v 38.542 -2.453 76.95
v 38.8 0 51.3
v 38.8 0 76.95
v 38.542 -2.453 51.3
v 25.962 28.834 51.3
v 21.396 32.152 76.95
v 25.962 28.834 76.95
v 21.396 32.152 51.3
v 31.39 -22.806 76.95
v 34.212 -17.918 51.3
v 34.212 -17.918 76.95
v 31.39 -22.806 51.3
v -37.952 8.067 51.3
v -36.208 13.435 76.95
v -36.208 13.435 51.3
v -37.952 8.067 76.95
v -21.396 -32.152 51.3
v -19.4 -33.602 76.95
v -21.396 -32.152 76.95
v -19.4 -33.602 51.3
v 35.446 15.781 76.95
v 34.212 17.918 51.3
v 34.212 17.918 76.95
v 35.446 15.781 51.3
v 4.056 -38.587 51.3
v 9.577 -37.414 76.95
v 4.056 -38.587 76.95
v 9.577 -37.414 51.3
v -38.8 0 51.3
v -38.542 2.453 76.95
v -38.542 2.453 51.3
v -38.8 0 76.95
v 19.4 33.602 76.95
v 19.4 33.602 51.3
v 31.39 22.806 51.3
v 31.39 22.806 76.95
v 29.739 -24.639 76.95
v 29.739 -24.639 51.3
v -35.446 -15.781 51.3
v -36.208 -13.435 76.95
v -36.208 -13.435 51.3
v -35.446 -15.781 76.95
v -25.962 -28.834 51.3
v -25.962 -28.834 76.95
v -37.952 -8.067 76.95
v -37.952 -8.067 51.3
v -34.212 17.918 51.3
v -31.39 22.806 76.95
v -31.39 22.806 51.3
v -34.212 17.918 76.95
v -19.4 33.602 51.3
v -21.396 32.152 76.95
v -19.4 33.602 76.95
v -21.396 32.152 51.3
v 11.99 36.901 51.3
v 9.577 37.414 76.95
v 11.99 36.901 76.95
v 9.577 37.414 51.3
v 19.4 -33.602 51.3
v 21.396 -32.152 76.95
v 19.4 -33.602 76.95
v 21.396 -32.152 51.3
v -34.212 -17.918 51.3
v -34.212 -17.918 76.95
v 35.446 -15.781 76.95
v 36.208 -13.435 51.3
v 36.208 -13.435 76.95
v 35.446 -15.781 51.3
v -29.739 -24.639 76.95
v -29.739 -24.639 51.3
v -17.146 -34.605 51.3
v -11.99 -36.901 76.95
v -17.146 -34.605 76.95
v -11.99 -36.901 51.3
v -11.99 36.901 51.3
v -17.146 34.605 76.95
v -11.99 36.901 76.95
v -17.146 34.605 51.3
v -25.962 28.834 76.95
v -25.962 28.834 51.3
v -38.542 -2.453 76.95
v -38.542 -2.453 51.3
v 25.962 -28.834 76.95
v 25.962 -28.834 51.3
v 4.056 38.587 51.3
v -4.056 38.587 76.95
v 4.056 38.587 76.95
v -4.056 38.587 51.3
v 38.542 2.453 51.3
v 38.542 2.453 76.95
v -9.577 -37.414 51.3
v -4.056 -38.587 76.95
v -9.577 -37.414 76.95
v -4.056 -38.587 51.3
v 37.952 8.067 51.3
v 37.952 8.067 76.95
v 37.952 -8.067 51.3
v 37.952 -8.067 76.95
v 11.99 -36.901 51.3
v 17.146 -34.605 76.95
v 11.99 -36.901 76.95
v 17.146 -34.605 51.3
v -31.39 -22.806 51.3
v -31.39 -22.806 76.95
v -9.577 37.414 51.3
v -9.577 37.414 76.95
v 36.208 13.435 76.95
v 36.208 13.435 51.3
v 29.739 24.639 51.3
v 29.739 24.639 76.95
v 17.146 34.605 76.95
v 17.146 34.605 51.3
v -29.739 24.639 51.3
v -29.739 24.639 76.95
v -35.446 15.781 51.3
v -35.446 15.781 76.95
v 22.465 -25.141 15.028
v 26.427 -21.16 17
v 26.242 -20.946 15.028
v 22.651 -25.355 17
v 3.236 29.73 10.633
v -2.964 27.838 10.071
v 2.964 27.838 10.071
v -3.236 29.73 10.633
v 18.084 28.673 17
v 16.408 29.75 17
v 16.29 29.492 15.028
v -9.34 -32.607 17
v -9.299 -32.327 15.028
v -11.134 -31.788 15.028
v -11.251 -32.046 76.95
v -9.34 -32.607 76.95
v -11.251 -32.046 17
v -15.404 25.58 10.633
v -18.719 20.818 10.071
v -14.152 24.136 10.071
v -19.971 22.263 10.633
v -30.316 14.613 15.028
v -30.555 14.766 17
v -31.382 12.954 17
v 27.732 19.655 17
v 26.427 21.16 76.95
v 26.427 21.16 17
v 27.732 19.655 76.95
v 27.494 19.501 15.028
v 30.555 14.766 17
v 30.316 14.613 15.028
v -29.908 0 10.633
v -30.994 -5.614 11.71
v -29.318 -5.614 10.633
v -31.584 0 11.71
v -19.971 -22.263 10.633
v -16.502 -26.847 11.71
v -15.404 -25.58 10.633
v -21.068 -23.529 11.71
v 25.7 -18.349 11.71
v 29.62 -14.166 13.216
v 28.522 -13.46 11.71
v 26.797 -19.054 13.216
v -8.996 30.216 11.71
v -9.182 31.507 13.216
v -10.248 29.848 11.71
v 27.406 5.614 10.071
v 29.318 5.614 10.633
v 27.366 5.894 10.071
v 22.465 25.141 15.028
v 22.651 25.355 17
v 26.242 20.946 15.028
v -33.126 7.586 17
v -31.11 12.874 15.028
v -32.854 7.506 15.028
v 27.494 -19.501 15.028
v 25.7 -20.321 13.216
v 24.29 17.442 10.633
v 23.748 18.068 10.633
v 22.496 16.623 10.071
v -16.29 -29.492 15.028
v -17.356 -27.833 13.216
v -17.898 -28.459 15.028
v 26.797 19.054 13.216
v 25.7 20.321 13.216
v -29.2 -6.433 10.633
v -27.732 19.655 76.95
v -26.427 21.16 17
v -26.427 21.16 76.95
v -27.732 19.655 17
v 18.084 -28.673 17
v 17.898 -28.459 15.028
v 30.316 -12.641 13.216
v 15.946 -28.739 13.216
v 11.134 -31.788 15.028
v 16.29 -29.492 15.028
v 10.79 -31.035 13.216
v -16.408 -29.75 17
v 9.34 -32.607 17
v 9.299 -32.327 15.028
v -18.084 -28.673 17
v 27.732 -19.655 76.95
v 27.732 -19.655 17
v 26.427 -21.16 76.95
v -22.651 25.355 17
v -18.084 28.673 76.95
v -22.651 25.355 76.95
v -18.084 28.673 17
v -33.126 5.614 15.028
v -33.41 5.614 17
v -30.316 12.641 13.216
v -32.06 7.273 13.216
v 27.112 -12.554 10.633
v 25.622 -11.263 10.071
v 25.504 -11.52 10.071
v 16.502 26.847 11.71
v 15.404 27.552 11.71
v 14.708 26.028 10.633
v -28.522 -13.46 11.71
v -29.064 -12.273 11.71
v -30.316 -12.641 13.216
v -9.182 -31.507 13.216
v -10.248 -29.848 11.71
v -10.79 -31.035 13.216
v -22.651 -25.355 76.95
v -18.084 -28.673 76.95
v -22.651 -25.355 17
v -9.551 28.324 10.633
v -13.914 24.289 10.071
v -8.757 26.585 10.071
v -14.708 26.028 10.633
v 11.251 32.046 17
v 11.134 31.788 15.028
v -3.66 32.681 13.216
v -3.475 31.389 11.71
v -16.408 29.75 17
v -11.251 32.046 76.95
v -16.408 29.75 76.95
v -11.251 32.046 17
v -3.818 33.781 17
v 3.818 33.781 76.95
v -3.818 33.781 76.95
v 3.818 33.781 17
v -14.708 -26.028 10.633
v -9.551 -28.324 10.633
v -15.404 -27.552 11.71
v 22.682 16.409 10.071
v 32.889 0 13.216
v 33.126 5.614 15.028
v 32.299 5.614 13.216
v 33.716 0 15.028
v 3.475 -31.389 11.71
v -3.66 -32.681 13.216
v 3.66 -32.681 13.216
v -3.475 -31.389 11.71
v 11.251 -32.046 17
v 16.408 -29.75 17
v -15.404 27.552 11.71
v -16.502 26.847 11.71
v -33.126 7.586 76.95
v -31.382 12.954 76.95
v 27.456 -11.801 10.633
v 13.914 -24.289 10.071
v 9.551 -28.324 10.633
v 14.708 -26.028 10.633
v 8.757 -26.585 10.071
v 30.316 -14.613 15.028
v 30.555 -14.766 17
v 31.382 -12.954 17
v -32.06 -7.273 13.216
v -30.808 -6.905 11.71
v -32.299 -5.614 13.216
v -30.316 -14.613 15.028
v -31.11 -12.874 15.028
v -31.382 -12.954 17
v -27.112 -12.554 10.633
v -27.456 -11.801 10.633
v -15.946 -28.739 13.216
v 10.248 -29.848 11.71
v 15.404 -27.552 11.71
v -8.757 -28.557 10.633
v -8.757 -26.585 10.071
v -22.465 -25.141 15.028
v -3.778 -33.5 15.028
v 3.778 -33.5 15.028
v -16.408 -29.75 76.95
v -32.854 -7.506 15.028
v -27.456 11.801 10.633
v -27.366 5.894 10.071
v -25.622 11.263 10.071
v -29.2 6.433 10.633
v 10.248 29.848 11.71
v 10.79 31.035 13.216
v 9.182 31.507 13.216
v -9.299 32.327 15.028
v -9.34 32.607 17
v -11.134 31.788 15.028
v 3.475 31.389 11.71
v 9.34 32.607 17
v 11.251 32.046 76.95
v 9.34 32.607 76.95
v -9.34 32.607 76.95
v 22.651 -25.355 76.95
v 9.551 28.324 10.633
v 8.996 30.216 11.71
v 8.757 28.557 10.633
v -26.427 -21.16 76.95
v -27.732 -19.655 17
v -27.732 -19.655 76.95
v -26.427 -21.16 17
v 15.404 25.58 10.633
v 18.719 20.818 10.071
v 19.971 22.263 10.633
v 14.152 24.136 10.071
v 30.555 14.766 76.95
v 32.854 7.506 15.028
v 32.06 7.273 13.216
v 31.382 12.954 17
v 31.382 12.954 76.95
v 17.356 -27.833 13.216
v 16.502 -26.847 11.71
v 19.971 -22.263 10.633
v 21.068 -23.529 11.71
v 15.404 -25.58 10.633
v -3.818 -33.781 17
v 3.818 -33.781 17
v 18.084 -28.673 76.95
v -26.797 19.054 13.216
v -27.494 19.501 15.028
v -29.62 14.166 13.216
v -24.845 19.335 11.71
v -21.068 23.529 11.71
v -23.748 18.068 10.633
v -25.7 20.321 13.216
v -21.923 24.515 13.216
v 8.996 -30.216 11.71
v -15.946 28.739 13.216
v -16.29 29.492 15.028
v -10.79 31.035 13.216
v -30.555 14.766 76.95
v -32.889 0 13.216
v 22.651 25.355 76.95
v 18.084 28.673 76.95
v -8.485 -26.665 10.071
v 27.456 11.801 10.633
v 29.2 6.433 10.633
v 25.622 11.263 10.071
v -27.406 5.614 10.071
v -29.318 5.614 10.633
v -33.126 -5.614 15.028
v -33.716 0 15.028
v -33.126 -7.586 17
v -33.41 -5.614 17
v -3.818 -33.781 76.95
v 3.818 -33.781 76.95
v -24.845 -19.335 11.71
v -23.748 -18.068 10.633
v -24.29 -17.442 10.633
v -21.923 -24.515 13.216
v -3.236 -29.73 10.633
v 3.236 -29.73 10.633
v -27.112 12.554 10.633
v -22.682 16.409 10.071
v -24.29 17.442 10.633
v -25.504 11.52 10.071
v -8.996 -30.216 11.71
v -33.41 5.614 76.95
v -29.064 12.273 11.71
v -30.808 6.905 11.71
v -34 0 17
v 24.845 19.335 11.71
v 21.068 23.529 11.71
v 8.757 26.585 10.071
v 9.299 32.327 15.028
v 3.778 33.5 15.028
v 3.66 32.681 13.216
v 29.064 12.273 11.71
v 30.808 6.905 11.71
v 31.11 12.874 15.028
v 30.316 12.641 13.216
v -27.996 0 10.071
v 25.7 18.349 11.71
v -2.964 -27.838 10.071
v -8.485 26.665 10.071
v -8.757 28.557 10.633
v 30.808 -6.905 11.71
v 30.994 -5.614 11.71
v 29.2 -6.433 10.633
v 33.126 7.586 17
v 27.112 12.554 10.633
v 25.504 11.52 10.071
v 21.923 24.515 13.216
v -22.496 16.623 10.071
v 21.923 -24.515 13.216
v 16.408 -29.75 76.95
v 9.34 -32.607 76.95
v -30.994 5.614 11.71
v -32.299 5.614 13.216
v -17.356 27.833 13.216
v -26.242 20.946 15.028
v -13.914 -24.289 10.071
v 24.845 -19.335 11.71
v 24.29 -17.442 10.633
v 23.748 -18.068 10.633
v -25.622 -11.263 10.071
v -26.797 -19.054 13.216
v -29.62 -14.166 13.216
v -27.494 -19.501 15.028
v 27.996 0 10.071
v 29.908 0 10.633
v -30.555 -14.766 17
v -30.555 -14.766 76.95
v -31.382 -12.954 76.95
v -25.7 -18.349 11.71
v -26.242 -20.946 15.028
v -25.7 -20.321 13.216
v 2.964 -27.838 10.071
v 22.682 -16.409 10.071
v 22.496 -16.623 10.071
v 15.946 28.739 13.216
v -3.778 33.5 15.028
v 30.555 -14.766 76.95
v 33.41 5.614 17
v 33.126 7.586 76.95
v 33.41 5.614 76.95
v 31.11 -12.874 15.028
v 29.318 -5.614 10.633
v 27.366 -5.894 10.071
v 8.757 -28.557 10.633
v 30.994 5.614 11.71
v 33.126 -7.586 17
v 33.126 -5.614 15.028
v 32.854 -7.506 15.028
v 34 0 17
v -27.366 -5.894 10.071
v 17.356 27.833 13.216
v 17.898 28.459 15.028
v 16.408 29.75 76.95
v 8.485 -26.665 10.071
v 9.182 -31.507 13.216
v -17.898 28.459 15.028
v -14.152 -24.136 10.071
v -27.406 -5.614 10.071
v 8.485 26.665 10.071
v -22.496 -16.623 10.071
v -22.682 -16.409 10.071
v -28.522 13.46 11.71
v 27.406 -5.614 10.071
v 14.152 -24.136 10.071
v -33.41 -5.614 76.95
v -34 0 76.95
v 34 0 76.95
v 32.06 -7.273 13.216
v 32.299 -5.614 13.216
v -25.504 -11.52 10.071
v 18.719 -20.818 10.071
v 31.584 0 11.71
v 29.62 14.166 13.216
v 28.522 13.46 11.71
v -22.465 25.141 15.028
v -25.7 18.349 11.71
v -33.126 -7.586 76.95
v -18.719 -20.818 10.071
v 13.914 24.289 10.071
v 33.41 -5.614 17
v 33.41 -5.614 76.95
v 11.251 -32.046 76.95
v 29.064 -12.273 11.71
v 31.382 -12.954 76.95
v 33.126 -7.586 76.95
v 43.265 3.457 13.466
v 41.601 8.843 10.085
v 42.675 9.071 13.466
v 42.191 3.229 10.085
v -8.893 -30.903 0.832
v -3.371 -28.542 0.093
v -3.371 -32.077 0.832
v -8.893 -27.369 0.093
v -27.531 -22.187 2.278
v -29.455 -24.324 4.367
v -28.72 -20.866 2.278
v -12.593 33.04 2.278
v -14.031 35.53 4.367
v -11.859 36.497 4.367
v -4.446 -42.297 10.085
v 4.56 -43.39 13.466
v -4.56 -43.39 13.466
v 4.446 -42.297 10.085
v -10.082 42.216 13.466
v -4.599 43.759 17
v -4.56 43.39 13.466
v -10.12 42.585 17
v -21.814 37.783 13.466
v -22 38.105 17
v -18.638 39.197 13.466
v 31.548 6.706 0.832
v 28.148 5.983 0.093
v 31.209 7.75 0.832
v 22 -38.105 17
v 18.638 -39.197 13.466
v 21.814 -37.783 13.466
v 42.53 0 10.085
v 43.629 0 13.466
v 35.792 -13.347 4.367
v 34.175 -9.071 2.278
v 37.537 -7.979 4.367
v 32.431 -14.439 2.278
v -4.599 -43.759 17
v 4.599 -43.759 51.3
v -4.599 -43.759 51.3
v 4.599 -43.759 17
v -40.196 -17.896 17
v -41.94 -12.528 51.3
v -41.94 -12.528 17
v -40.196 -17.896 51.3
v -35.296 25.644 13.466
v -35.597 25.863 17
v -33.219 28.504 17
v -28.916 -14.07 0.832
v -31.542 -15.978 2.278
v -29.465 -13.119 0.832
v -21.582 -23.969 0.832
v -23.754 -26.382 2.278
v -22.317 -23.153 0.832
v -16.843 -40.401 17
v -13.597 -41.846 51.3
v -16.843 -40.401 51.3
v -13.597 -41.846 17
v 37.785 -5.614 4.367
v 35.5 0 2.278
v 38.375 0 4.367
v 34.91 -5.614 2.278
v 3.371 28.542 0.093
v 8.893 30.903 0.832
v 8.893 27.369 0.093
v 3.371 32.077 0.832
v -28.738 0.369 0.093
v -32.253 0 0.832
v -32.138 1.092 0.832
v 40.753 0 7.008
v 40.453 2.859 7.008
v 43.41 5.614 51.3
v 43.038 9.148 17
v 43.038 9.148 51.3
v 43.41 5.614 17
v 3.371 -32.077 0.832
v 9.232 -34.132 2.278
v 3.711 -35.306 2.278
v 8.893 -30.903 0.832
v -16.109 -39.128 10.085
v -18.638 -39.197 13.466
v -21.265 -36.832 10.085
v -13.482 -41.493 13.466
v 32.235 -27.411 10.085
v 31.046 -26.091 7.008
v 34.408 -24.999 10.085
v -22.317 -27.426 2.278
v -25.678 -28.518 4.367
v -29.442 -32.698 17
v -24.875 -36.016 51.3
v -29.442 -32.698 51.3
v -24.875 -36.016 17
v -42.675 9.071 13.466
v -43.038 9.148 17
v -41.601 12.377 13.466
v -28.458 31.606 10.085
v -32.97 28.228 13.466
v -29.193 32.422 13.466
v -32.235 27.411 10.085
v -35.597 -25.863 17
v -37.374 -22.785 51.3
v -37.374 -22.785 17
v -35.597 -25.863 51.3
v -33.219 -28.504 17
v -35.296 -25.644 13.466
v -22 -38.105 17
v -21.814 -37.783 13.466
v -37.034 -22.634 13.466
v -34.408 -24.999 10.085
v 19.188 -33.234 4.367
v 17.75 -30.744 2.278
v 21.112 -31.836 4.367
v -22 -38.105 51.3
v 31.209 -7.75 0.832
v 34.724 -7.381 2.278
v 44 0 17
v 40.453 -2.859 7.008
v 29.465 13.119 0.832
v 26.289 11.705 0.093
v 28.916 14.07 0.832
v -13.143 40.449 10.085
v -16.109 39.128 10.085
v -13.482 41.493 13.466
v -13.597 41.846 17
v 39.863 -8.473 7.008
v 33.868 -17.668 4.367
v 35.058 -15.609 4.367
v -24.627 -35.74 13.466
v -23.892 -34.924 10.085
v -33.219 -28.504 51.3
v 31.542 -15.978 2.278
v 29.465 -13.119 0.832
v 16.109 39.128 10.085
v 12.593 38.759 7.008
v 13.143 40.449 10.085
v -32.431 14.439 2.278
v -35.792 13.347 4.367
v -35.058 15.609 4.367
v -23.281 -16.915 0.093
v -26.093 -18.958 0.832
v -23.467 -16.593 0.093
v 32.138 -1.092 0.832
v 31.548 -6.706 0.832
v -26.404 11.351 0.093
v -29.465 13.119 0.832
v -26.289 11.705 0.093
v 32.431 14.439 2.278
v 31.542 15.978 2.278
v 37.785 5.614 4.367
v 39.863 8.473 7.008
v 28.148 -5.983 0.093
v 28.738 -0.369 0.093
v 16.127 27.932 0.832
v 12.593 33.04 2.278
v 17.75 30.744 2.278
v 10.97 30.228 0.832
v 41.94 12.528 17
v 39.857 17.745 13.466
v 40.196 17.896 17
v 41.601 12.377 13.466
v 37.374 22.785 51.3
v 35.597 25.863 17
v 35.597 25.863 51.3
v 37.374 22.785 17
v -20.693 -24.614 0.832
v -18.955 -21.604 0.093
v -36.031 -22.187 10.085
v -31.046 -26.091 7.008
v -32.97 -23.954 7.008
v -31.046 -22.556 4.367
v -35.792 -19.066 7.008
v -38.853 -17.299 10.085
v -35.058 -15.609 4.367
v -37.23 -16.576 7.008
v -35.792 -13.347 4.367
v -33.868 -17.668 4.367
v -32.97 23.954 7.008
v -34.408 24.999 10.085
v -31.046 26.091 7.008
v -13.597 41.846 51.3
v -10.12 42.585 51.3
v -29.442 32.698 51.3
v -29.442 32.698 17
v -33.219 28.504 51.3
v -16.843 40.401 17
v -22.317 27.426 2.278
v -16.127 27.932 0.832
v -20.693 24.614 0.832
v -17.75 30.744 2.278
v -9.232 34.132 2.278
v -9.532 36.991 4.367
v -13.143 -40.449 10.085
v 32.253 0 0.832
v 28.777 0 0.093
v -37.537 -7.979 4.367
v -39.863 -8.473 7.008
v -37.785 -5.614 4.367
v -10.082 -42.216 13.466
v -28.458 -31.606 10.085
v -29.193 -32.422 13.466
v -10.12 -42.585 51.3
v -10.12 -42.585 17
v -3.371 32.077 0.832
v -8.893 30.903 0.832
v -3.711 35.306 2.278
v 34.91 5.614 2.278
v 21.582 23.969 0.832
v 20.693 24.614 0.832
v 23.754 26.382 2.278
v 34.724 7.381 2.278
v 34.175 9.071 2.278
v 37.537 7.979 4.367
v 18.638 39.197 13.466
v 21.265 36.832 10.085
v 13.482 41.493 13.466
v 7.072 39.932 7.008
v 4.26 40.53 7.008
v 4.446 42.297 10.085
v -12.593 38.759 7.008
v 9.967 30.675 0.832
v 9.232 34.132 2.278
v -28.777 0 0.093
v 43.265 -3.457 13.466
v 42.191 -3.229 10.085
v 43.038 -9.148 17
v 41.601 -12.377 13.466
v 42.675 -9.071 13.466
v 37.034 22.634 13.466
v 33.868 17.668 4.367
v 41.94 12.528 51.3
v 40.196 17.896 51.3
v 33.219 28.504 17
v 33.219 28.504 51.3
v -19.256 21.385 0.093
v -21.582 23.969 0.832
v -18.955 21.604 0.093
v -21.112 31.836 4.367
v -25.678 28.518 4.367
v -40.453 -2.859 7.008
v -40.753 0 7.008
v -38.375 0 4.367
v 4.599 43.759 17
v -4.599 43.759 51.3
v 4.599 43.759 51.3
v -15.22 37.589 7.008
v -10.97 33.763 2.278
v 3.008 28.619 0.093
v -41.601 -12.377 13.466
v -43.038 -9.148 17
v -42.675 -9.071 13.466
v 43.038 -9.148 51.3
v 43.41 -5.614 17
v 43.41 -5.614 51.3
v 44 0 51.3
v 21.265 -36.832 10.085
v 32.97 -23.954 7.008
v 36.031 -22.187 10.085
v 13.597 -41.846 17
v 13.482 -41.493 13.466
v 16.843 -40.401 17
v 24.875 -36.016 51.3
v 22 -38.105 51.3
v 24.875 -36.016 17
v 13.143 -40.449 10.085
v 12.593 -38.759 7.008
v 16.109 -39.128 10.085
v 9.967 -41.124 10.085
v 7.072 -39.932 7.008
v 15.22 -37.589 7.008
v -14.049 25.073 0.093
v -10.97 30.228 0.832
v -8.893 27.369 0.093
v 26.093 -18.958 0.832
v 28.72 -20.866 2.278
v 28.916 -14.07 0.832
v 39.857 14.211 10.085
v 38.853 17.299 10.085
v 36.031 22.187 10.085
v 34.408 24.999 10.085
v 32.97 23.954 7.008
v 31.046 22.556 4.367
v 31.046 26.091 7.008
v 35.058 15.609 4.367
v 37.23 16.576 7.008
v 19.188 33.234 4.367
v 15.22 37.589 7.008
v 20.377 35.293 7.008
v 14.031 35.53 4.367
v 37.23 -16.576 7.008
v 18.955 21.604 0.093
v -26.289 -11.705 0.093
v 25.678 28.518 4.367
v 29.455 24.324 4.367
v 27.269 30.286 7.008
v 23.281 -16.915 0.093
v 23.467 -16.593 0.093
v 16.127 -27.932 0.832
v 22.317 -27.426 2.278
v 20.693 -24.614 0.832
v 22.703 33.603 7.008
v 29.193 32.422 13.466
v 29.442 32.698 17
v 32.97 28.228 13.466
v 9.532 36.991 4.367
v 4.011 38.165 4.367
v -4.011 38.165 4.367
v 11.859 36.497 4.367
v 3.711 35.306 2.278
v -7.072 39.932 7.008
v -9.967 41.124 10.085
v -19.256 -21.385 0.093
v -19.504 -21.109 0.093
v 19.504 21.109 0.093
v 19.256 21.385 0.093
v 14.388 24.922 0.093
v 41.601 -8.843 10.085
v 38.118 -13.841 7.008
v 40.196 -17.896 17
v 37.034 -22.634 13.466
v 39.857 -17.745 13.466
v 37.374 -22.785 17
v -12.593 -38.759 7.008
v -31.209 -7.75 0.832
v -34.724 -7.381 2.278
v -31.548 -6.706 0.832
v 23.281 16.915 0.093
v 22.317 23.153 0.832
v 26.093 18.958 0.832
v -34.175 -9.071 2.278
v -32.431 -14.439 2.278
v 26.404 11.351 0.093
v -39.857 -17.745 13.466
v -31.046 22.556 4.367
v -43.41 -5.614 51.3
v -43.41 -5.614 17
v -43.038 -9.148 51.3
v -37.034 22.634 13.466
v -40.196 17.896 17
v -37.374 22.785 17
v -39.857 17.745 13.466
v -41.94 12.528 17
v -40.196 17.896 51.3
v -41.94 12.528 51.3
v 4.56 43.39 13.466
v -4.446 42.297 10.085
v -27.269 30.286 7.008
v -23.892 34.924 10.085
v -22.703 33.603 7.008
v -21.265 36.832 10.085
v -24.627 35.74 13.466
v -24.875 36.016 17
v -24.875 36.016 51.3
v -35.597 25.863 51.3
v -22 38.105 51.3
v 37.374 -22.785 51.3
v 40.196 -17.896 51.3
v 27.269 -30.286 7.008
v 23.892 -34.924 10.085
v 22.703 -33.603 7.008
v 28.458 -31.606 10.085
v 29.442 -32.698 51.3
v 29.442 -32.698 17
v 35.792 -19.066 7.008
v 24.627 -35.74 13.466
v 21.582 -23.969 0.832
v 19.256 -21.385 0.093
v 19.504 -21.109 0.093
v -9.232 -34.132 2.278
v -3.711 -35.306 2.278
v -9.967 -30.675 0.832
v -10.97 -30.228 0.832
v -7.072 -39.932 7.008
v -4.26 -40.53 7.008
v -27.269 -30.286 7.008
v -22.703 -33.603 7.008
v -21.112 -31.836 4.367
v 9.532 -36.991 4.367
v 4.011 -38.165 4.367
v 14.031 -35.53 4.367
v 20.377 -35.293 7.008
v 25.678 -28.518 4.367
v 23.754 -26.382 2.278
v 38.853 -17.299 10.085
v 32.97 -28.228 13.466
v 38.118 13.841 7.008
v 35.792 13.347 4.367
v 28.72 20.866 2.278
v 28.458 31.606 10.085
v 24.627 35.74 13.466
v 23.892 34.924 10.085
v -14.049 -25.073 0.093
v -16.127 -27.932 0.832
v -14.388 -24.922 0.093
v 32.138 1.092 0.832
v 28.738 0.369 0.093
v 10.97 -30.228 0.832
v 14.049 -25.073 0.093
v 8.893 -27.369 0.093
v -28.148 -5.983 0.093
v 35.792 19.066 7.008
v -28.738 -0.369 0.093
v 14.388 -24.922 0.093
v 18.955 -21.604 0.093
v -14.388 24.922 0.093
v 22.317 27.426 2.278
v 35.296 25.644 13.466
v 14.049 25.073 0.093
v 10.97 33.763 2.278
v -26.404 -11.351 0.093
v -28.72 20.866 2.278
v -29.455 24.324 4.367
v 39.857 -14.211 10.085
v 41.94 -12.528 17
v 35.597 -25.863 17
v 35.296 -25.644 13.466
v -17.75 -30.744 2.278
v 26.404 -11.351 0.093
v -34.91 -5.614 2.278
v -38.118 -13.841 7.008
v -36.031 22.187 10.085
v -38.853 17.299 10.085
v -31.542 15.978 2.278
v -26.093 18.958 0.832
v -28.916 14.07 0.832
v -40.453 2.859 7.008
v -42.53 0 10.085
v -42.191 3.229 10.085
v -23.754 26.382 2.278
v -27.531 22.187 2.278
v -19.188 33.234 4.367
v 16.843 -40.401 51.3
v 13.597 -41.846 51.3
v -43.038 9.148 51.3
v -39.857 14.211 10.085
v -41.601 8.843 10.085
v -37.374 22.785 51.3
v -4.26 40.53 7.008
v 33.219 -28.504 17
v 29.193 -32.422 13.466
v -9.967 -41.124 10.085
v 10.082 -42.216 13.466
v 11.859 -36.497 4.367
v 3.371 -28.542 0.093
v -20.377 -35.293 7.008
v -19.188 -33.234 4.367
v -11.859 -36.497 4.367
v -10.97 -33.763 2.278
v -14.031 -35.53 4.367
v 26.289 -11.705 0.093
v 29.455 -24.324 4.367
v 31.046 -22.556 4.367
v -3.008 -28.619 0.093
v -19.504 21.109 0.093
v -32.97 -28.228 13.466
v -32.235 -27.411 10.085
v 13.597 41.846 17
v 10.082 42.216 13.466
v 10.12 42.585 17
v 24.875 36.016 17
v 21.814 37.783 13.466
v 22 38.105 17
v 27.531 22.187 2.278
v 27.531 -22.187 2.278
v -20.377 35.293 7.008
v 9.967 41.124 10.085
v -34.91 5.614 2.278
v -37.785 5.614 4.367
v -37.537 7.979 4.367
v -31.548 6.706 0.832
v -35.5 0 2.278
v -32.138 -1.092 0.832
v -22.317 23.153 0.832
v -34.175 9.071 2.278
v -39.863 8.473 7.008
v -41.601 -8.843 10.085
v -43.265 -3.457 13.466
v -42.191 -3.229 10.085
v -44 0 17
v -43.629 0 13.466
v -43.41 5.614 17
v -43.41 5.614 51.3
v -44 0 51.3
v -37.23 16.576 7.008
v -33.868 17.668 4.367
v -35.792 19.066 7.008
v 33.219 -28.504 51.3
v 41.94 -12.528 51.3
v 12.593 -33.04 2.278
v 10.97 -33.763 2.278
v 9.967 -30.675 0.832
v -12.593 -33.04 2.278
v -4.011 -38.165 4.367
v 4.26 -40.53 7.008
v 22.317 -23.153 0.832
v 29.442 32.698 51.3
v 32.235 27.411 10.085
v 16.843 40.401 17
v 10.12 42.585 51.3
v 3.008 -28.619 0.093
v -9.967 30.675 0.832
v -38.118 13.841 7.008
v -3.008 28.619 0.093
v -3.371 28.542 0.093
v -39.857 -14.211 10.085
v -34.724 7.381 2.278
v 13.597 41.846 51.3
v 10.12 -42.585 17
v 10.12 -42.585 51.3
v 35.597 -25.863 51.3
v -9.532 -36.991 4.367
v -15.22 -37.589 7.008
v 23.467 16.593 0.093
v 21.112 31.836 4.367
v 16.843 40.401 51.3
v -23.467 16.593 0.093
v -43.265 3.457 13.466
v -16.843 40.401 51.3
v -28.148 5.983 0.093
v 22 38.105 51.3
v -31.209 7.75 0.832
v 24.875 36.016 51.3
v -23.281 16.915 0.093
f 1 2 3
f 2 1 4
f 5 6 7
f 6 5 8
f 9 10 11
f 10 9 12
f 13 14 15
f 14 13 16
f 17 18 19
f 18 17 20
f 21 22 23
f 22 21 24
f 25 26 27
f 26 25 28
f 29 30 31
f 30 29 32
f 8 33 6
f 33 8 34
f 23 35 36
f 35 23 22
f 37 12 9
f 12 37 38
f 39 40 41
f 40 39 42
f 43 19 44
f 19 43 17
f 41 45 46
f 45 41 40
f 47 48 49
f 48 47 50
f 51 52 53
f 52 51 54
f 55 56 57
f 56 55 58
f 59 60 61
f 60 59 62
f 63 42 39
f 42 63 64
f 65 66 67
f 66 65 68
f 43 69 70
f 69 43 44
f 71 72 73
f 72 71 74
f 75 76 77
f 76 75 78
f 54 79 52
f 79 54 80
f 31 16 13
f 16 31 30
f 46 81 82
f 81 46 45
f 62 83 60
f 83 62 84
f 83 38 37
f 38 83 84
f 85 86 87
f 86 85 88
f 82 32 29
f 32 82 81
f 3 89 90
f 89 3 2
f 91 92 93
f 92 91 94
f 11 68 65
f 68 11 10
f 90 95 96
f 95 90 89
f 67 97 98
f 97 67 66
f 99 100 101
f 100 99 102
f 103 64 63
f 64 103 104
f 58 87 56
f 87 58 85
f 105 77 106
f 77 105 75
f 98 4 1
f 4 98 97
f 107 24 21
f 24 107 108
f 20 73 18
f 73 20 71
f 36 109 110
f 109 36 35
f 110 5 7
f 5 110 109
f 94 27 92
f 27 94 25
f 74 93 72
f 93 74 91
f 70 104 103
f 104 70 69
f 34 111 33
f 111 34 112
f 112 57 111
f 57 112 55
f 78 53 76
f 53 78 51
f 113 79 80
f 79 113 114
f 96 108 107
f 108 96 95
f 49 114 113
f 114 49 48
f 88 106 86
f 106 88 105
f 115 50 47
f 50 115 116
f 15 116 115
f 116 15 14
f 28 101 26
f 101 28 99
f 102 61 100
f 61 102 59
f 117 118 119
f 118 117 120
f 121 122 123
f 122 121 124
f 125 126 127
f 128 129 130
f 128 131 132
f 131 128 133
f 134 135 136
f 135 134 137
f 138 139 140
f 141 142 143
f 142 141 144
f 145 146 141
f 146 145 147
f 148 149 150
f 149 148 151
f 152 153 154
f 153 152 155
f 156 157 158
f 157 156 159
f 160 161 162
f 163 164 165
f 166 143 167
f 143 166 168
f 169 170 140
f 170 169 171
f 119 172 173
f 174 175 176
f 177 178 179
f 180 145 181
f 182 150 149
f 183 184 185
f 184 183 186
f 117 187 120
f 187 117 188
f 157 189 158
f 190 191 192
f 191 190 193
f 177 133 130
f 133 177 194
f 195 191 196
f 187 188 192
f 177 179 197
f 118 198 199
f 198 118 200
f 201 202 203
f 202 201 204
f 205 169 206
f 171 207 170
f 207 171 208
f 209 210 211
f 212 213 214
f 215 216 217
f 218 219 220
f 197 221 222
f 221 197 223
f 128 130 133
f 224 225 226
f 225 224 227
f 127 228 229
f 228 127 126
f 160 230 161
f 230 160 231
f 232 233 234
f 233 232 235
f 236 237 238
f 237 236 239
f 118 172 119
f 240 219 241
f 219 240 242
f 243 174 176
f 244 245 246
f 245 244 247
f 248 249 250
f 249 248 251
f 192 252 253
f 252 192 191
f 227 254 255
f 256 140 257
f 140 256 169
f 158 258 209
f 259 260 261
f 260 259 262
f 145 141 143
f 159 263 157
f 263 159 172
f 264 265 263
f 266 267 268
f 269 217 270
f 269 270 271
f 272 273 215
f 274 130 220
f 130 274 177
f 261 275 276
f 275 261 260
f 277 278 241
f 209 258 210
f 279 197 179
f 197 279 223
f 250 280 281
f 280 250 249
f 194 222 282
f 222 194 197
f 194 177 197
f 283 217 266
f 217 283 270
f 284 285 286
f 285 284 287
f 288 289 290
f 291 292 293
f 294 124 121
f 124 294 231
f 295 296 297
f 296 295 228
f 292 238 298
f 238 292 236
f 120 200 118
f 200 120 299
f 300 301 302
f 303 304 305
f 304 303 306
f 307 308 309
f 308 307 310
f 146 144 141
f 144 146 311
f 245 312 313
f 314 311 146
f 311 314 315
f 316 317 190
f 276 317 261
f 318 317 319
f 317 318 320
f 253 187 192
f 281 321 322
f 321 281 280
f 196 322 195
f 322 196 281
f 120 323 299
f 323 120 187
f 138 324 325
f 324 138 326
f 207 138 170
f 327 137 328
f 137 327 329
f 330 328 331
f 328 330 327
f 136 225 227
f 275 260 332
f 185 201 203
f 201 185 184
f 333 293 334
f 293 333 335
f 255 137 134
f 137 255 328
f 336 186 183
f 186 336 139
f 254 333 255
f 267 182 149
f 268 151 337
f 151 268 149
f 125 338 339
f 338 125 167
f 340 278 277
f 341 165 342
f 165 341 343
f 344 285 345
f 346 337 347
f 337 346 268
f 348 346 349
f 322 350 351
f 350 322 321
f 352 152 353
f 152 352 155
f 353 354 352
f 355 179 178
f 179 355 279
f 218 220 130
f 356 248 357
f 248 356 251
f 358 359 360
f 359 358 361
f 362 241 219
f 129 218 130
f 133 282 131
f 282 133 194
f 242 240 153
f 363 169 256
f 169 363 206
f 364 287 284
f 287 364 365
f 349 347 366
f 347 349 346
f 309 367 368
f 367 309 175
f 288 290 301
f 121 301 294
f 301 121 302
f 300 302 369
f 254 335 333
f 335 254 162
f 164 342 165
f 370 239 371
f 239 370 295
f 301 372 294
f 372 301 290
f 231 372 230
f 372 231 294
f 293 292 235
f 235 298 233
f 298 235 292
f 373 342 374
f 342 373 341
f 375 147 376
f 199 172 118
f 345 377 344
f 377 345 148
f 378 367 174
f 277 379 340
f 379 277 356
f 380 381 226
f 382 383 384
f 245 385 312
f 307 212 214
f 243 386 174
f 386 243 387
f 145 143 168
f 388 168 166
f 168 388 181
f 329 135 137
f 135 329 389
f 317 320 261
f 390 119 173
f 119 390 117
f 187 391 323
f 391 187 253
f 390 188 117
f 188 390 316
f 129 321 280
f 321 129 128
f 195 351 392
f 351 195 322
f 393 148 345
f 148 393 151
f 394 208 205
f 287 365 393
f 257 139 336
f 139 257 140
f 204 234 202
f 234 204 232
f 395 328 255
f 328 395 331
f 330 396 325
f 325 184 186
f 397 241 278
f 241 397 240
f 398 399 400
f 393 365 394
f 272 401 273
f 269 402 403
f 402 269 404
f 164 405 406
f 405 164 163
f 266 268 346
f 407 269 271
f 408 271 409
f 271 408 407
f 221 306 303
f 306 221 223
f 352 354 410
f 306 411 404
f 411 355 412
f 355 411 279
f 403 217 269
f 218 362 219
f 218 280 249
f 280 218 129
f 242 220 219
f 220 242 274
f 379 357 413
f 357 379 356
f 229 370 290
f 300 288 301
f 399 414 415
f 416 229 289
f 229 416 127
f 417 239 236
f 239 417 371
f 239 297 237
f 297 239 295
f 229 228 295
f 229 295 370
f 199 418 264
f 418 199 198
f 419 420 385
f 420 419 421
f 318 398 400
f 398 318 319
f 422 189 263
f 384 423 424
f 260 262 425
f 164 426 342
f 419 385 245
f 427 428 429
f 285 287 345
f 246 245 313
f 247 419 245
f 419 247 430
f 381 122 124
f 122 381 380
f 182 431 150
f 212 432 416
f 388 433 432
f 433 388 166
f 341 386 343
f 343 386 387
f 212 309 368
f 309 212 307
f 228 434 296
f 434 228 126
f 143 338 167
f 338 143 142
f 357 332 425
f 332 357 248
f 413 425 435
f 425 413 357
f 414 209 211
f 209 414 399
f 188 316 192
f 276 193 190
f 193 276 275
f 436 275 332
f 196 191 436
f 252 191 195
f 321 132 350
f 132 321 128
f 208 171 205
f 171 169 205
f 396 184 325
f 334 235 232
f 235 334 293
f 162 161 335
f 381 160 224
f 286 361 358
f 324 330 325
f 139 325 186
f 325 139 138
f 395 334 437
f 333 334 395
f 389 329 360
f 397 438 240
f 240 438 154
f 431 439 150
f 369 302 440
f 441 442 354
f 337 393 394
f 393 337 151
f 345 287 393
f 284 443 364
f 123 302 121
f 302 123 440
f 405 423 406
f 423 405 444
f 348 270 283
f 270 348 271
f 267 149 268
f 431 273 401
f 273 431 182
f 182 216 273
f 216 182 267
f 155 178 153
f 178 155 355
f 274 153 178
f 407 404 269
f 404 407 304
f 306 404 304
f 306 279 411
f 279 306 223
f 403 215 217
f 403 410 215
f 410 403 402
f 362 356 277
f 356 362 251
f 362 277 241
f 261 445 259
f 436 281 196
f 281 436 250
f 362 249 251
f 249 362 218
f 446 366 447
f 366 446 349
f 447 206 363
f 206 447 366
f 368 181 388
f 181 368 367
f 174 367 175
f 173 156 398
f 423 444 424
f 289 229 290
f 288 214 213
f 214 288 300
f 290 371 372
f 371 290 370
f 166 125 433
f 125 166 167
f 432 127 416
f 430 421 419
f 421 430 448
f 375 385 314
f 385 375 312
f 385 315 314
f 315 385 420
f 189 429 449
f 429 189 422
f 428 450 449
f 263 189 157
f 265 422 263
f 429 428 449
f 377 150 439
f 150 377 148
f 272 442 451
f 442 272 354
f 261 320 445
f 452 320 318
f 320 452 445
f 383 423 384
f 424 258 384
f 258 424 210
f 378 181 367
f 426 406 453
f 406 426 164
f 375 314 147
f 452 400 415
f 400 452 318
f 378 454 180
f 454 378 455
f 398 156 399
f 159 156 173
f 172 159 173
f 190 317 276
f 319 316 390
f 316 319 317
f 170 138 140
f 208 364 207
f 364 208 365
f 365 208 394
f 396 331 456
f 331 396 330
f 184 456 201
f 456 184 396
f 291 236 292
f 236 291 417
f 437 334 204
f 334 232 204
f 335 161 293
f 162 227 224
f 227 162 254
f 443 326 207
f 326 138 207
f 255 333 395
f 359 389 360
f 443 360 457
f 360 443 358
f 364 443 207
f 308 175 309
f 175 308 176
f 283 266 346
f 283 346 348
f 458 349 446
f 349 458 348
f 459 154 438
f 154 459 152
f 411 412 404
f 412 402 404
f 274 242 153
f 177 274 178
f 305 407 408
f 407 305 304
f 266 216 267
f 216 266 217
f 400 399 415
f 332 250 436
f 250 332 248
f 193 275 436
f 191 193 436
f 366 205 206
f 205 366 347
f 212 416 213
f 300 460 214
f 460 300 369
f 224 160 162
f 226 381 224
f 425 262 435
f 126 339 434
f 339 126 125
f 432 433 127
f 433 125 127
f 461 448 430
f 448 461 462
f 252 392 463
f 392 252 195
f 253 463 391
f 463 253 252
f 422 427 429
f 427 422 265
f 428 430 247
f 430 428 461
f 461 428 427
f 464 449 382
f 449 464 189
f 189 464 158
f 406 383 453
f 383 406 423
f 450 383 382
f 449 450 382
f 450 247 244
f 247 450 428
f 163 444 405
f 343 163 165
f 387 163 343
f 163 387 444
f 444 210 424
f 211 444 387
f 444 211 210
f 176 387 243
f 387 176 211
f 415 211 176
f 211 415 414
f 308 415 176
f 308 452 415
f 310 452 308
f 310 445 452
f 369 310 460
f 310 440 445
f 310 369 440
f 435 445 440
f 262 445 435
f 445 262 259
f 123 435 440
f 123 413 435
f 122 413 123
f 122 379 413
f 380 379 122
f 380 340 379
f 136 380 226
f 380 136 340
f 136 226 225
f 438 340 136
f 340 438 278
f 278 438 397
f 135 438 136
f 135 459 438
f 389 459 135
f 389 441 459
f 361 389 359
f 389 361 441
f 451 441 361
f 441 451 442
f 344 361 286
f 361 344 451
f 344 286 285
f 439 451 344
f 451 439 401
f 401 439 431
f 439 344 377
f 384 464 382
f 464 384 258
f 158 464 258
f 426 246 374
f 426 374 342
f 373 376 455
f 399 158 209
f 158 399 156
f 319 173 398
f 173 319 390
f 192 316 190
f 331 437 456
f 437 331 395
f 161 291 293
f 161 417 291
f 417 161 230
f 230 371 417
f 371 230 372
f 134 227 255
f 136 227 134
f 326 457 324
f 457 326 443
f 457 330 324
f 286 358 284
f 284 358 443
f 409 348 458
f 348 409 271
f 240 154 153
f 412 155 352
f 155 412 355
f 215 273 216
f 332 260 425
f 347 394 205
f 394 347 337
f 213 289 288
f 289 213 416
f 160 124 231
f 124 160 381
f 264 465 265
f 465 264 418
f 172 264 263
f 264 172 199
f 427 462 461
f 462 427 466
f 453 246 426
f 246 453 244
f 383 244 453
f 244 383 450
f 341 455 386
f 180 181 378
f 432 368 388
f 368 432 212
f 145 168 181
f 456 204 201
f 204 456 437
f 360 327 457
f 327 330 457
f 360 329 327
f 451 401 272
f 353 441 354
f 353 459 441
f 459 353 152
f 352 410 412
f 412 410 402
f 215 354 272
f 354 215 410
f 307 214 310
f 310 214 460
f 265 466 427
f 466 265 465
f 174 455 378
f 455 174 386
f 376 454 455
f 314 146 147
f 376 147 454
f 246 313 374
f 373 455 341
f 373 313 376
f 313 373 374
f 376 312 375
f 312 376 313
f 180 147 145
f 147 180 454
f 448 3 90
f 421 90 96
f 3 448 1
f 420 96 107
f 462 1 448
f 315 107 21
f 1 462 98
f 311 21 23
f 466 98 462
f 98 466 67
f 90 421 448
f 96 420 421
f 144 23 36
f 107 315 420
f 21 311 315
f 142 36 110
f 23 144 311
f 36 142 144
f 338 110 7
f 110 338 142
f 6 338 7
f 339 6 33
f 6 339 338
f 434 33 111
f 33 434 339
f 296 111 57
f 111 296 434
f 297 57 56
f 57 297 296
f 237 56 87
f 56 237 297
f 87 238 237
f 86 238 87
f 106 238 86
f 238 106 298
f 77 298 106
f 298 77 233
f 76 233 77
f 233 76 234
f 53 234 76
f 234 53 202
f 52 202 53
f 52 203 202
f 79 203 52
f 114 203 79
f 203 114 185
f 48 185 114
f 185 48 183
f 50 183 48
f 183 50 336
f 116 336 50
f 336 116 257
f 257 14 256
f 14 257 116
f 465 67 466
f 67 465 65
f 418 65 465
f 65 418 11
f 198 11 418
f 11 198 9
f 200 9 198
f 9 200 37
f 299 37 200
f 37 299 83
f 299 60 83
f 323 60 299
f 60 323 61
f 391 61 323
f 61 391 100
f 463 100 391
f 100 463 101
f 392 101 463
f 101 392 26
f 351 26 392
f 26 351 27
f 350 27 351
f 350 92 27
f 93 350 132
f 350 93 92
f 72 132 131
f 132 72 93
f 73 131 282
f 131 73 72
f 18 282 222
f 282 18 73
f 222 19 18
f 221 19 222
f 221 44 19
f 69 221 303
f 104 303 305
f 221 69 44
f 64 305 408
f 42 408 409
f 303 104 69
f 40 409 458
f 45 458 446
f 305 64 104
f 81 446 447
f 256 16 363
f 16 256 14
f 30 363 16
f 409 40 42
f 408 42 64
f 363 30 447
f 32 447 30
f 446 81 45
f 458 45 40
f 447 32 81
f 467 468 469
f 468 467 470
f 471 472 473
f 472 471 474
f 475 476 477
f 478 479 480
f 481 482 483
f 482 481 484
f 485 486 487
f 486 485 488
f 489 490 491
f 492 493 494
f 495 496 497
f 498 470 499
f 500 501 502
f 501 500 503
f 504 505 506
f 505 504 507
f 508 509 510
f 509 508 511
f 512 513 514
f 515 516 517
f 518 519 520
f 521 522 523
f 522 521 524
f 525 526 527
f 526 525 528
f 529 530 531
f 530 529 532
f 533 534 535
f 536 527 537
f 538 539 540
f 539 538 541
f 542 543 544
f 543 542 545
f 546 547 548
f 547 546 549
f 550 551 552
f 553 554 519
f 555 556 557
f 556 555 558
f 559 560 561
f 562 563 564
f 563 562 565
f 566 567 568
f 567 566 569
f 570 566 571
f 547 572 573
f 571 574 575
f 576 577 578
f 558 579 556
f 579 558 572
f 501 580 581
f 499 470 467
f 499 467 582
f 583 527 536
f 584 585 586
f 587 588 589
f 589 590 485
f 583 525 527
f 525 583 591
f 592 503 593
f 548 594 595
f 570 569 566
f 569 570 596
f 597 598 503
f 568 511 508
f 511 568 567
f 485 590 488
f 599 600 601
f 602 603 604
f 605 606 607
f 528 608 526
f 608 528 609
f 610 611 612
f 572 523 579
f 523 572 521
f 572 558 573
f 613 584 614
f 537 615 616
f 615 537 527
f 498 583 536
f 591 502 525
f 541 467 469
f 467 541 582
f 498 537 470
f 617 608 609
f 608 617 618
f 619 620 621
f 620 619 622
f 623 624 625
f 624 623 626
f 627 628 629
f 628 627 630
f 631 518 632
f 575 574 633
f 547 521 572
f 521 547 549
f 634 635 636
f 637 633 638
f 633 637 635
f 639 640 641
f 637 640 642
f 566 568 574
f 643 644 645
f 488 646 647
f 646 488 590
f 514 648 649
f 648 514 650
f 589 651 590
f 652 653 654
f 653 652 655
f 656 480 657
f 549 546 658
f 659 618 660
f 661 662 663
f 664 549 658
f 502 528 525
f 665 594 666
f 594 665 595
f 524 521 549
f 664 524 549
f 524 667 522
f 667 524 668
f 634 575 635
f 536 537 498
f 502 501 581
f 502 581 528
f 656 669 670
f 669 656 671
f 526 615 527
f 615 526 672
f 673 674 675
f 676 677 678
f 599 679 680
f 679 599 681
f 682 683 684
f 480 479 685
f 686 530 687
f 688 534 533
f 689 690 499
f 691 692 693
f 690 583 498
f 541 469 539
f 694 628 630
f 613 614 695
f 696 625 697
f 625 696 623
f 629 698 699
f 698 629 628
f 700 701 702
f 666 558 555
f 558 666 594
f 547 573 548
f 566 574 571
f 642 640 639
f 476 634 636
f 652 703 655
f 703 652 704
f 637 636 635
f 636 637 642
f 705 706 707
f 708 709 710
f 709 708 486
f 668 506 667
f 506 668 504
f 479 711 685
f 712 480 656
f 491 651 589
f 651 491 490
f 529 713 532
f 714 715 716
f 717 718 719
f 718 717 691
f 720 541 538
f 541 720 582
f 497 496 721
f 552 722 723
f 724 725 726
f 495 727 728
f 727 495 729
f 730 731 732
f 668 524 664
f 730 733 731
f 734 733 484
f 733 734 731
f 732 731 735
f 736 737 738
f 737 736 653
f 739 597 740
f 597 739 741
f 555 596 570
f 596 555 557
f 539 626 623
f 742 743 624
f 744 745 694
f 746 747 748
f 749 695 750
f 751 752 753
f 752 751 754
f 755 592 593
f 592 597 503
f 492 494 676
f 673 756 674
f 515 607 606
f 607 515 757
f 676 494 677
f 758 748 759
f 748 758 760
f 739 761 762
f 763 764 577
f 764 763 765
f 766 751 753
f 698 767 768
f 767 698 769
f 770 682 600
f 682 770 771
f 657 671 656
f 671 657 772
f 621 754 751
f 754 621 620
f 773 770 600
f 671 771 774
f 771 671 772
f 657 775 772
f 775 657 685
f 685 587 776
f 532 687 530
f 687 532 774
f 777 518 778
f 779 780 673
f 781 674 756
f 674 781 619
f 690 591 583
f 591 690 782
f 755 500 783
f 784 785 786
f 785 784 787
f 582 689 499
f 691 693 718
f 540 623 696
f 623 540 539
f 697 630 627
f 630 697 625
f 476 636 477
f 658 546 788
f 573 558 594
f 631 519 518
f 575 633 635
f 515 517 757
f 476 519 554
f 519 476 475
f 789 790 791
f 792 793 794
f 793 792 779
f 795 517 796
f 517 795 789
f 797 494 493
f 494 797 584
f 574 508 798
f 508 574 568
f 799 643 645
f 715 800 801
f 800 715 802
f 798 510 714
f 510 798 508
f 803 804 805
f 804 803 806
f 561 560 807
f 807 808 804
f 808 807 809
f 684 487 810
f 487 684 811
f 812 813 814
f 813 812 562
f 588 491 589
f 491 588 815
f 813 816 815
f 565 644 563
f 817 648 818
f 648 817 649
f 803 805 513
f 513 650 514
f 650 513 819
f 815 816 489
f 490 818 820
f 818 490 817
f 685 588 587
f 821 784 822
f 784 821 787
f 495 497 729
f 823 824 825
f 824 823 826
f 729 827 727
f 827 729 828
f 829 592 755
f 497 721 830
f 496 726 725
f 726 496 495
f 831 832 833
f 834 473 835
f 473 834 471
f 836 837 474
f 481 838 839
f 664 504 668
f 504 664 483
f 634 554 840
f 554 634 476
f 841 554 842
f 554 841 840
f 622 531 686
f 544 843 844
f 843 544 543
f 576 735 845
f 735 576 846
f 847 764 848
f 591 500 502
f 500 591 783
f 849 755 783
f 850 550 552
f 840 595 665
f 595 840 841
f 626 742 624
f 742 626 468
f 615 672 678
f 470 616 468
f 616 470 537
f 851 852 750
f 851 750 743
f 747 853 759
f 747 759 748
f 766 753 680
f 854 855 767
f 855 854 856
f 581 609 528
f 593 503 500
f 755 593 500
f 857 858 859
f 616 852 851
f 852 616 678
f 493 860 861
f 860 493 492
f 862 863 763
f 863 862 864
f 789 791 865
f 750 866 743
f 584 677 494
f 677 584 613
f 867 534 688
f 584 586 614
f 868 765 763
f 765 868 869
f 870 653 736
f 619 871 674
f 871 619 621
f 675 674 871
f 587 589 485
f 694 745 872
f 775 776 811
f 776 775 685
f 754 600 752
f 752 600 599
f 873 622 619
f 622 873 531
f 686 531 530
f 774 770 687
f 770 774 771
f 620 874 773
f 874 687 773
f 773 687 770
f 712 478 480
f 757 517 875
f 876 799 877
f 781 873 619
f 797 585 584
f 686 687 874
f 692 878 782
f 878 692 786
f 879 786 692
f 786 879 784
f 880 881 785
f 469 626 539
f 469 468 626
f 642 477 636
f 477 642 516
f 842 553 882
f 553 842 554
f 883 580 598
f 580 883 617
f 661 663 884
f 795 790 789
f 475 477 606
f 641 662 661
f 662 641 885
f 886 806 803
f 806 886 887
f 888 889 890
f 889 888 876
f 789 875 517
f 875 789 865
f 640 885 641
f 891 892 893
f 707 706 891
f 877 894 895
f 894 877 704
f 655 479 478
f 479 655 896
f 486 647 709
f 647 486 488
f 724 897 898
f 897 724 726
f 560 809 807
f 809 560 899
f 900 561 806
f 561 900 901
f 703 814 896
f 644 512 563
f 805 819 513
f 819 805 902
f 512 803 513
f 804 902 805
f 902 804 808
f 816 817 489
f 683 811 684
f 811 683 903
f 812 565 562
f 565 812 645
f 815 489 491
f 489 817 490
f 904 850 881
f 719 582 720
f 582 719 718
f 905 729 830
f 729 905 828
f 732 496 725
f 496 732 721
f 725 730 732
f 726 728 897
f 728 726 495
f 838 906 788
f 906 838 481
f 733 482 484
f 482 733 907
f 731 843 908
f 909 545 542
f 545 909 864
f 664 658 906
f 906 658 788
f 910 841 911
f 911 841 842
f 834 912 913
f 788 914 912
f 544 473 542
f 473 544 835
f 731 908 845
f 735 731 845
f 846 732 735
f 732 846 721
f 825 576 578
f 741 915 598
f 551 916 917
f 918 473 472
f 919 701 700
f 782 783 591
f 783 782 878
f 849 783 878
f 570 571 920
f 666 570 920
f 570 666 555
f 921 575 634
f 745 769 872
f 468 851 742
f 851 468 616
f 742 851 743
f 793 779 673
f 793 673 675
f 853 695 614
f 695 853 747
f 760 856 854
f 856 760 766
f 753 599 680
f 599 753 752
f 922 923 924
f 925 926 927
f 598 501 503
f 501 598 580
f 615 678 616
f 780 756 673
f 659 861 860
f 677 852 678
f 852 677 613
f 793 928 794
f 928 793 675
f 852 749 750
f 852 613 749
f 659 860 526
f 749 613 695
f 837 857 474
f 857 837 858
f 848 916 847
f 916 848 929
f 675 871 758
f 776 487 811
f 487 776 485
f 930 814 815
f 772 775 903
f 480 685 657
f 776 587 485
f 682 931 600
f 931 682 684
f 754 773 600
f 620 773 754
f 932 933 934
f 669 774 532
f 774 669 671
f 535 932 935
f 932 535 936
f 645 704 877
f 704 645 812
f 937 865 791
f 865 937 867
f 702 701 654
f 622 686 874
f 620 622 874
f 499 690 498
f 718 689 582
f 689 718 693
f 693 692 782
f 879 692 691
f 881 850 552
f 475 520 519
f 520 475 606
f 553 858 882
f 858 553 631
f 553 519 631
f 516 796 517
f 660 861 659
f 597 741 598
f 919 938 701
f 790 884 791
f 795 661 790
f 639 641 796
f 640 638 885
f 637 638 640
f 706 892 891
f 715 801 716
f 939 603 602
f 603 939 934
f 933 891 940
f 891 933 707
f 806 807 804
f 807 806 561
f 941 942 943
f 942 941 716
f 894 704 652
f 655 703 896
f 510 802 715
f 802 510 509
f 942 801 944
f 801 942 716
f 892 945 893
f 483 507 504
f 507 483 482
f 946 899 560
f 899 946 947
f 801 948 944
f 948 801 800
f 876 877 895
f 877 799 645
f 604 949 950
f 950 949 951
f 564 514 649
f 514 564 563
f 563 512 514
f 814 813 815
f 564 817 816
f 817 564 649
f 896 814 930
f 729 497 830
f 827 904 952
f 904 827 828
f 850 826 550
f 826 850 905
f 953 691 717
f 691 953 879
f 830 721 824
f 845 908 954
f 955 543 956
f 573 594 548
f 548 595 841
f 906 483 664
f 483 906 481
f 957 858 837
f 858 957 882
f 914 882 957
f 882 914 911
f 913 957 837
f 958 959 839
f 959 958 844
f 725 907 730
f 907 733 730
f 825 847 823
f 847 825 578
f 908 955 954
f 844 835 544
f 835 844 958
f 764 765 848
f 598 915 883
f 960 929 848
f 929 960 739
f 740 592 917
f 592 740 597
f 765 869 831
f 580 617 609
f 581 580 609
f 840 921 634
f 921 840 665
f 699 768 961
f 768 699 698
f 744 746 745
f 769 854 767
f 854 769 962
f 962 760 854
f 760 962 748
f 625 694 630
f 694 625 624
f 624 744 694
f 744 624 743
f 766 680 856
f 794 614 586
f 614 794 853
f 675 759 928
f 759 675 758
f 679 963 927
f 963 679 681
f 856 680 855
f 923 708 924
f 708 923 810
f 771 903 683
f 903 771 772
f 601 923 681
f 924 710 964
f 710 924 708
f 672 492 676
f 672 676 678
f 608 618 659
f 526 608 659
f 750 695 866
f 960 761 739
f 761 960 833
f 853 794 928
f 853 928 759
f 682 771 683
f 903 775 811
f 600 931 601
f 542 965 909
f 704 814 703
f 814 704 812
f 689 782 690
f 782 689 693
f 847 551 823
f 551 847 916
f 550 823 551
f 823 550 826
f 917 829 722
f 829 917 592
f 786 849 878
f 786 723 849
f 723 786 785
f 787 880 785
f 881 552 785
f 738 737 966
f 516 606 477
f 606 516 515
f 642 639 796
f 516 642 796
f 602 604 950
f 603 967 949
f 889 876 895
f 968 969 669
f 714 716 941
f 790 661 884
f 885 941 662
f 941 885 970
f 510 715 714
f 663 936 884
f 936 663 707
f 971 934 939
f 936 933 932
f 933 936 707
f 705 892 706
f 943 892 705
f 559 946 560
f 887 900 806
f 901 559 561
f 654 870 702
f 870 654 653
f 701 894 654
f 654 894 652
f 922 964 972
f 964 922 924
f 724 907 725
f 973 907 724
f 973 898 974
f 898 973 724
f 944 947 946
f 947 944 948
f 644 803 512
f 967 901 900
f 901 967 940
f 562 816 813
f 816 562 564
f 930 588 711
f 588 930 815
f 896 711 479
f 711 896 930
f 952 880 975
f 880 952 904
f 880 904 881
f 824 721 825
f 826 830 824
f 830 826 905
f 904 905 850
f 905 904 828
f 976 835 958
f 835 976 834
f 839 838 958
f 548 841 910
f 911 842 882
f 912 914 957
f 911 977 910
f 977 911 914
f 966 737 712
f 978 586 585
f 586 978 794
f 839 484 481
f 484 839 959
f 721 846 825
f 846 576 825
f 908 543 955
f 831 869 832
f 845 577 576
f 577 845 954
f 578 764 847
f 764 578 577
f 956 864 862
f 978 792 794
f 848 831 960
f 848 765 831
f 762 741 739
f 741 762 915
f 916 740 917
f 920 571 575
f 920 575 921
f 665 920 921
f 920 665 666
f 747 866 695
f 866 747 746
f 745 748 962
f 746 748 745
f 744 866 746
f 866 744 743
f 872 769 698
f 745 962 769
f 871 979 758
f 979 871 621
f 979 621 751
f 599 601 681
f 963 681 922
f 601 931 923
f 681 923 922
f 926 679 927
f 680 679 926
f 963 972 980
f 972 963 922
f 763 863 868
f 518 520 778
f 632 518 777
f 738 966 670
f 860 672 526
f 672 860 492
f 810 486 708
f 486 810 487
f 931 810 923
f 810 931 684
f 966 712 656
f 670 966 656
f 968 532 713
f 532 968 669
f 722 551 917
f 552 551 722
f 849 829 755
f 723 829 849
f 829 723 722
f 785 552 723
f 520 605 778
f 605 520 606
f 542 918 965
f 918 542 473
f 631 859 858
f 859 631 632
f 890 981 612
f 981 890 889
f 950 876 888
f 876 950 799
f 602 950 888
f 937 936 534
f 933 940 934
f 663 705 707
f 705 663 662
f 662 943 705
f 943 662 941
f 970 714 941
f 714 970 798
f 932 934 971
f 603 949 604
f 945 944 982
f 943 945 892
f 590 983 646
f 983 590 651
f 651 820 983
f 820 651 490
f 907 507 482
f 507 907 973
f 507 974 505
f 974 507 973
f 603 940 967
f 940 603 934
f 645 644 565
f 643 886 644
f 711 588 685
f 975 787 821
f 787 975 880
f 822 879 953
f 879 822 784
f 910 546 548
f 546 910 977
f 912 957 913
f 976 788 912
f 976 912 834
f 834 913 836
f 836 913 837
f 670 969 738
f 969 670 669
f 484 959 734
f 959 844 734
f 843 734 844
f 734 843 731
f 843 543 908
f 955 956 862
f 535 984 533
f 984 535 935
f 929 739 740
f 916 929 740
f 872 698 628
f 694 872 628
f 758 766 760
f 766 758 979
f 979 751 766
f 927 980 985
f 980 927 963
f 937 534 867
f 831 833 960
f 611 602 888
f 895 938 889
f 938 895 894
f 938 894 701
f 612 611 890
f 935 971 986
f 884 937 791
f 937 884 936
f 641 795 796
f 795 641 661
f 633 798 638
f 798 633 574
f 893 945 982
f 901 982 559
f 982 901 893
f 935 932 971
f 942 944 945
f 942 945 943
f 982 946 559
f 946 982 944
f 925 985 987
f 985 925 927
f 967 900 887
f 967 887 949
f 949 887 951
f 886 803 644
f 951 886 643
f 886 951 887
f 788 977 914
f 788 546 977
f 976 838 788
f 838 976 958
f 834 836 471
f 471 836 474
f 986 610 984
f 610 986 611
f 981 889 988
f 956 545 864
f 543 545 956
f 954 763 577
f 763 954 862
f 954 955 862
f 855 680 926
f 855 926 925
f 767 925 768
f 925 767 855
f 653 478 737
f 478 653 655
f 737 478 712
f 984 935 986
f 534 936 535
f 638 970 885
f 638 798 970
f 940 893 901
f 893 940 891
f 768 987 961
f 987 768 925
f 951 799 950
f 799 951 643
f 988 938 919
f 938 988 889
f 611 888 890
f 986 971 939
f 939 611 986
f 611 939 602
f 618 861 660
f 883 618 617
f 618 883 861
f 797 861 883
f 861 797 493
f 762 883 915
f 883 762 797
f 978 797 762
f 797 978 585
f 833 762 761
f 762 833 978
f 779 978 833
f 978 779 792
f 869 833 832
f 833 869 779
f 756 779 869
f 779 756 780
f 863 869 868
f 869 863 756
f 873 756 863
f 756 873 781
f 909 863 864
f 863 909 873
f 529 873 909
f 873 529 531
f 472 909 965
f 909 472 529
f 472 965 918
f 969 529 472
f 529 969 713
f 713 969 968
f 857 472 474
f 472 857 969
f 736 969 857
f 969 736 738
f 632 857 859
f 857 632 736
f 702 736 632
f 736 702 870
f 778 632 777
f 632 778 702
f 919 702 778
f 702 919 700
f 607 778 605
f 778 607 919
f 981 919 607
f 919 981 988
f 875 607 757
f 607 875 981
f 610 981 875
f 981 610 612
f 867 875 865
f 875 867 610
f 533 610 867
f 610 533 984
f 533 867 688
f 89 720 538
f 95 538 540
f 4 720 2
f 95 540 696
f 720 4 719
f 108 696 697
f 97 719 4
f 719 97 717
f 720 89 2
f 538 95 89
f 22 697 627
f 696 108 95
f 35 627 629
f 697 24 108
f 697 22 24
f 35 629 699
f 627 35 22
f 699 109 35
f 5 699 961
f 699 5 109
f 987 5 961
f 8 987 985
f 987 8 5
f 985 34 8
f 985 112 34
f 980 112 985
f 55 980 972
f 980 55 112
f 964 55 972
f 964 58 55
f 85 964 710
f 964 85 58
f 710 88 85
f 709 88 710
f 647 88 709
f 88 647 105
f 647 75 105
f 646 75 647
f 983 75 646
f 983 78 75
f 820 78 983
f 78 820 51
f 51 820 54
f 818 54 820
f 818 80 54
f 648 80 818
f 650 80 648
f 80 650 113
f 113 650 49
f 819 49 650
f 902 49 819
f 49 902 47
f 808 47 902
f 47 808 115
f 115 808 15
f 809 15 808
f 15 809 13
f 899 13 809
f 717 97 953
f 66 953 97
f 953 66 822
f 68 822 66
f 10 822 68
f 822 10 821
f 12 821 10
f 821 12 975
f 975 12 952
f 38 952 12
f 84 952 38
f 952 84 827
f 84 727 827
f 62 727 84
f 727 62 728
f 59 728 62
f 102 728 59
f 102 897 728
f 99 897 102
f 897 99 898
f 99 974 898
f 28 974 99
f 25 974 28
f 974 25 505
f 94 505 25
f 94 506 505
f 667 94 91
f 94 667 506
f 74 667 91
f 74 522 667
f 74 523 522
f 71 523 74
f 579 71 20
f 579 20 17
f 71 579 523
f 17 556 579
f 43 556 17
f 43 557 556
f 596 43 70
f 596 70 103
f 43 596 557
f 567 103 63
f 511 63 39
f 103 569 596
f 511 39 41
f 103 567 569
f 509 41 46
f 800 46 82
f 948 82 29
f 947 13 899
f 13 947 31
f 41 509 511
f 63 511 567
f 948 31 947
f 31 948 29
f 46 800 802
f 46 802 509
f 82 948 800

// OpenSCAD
hj=82.2;      //jar height
dj=67.3;      //jar diameter
rj=7;         //jar edge radius

nd=0.4;       //nozzle diameter
fl=0.2;       //first layer height
lh=0.2;       //print layer height

tw=10;         //wall thickness
fn=0;         //finish finenss

jlr=0.25;     //jar-lid ratio of total height

d=(floor(dj/nd)+2)*nd; echo(d);
h=(floor((hj-fl)/lh)+2)*lh+fl; echo(h);

union()
{
    
    translate([0,0,0])
    difference()
    {
        
        translate([0,0,rj+tw])
        minkowski()
        {
            cylinder(h=h-2*rj,d=d-2*rj,$fn=fn);
            sphere(r=rj+tw/2-nd/2,$fn=fn);
        }; 

        translate([0,0,rj+tw])
        minkowski()
        {
            cylinder(h=h-2*rj,d=d-2*rj,$fn=fn);
            sphere(r=rj,$fn=fn);
        };
        
        translate([0,0,(1-jlr)*(h+2*tw)])
        cylinder(h=h,d=d+rj+2*tw);;
    };

    translate([0,0,0])
    difference()
    {
        
        translate([0,0,rj+tw])
        minkowski()
        {
            cylinder(h=h-2*rj,d=d-2*rj,$fn=fn);
            sphere(r=rj+tw,$fn=fn);
        }; 

        translate([0,0,rj+tw])
        minkowski()
        {
            cylinder(h=h-2*rj,d=d-2*rj,$fn=fn);
            sphere(r=rj,$fn=fn);
        };
        
        translate([0,0,(1-0.5)*(h+2*tw)])
        cylinder(h=h,d=d+rj+2*tw);;
    };
};
